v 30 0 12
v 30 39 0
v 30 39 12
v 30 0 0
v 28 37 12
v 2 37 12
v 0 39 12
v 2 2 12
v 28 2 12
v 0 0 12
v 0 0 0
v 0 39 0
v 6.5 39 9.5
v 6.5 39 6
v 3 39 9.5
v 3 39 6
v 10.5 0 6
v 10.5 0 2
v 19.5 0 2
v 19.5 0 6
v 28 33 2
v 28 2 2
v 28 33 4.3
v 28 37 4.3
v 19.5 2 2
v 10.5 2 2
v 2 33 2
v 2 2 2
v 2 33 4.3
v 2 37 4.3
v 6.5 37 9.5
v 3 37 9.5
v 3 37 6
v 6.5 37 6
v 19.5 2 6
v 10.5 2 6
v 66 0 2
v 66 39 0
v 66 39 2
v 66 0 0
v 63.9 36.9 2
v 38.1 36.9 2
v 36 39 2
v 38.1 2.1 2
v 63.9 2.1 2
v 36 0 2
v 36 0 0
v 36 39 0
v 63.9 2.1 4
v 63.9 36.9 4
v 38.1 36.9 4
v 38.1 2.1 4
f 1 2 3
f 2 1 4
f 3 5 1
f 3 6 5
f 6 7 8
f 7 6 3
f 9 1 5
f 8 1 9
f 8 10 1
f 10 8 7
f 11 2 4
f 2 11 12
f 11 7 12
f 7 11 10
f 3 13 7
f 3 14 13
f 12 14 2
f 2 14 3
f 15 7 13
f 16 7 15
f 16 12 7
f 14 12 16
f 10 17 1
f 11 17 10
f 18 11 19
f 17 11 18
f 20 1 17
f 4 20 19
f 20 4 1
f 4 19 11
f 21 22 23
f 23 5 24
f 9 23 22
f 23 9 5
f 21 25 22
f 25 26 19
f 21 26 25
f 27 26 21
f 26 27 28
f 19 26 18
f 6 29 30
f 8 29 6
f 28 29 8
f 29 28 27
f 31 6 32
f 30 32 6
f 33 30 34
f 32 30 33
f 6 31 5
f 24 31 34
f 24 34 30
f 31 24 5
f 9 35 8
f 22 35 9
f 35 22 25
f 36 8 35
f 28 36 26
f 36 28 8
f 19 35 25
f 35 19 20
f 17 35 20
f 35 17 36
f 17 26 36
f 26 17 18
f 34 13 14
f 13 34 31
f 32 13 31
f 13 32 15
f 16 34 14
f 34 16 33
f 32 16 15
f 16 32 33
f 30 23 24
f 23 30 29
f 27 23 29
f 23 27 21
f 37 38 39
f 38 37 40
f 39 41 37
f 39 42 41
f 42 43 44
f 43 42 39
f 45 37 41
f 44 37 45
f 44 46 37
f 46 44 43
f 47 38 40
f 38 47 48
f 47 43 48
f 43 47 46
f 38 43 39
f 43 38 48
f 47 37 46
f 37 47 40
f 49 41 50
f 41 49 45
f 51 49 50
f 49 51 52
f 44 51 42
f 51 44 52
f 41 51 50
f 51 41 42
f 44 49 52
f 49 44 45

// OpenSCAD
wall_thickness=2;
wemos_x=26;
wemos_y=35;
wemos_z=10;

module wemos_case()
{
   usb_y=9;
   usb_z=4;
   difference()
   {
      wt2=wall_thickness*2;
      cube([wemos_x+wt2,wemos_y+wt2,wemos_z+wall_thickness]);
      // kill the inside of the enclosure
      translate([wall_thickness,wall_thickness,wall_thickness])
         cube([wemos_x,wemos_y,wemos_z+1]);
      // cut out the micro-usb opening
      translate([wall_thickness+wemos_x/2-usb_y/2,-1,wall_thickness])
         cube([usb_y,wall_thickness+2,usb_z]);
      // Cut a wiring notch 'above' the device
      translate([wall_thickness+1,wemos_y+wall_thickness-1,wall_thickness+4])
         cube([3.5,2*wall_thickness+2,3.5]);
   };
   // Add a support under the antenna
   translate([wall_thickness,wall_thickness+wemos_y-4,wall_thickness])
      cube([wemos_x,4,2.3]);
}

module wemos_lid()
{
   wt2=wall_thickness*2;
   cube([wemos_x+wt2,wemos_y+wt2,wall_thickness]);
   inset=0.1;
   translate([wall_thickness+inset,wall_thickness+inset,0])
      cube([wemos_x-inset*2,wemos_y-inset*2,wall_thickness*2]);
}


wemos_case();
translate([wemos_x+wall_thickness*2+6,0,0]) wemos_lid();
